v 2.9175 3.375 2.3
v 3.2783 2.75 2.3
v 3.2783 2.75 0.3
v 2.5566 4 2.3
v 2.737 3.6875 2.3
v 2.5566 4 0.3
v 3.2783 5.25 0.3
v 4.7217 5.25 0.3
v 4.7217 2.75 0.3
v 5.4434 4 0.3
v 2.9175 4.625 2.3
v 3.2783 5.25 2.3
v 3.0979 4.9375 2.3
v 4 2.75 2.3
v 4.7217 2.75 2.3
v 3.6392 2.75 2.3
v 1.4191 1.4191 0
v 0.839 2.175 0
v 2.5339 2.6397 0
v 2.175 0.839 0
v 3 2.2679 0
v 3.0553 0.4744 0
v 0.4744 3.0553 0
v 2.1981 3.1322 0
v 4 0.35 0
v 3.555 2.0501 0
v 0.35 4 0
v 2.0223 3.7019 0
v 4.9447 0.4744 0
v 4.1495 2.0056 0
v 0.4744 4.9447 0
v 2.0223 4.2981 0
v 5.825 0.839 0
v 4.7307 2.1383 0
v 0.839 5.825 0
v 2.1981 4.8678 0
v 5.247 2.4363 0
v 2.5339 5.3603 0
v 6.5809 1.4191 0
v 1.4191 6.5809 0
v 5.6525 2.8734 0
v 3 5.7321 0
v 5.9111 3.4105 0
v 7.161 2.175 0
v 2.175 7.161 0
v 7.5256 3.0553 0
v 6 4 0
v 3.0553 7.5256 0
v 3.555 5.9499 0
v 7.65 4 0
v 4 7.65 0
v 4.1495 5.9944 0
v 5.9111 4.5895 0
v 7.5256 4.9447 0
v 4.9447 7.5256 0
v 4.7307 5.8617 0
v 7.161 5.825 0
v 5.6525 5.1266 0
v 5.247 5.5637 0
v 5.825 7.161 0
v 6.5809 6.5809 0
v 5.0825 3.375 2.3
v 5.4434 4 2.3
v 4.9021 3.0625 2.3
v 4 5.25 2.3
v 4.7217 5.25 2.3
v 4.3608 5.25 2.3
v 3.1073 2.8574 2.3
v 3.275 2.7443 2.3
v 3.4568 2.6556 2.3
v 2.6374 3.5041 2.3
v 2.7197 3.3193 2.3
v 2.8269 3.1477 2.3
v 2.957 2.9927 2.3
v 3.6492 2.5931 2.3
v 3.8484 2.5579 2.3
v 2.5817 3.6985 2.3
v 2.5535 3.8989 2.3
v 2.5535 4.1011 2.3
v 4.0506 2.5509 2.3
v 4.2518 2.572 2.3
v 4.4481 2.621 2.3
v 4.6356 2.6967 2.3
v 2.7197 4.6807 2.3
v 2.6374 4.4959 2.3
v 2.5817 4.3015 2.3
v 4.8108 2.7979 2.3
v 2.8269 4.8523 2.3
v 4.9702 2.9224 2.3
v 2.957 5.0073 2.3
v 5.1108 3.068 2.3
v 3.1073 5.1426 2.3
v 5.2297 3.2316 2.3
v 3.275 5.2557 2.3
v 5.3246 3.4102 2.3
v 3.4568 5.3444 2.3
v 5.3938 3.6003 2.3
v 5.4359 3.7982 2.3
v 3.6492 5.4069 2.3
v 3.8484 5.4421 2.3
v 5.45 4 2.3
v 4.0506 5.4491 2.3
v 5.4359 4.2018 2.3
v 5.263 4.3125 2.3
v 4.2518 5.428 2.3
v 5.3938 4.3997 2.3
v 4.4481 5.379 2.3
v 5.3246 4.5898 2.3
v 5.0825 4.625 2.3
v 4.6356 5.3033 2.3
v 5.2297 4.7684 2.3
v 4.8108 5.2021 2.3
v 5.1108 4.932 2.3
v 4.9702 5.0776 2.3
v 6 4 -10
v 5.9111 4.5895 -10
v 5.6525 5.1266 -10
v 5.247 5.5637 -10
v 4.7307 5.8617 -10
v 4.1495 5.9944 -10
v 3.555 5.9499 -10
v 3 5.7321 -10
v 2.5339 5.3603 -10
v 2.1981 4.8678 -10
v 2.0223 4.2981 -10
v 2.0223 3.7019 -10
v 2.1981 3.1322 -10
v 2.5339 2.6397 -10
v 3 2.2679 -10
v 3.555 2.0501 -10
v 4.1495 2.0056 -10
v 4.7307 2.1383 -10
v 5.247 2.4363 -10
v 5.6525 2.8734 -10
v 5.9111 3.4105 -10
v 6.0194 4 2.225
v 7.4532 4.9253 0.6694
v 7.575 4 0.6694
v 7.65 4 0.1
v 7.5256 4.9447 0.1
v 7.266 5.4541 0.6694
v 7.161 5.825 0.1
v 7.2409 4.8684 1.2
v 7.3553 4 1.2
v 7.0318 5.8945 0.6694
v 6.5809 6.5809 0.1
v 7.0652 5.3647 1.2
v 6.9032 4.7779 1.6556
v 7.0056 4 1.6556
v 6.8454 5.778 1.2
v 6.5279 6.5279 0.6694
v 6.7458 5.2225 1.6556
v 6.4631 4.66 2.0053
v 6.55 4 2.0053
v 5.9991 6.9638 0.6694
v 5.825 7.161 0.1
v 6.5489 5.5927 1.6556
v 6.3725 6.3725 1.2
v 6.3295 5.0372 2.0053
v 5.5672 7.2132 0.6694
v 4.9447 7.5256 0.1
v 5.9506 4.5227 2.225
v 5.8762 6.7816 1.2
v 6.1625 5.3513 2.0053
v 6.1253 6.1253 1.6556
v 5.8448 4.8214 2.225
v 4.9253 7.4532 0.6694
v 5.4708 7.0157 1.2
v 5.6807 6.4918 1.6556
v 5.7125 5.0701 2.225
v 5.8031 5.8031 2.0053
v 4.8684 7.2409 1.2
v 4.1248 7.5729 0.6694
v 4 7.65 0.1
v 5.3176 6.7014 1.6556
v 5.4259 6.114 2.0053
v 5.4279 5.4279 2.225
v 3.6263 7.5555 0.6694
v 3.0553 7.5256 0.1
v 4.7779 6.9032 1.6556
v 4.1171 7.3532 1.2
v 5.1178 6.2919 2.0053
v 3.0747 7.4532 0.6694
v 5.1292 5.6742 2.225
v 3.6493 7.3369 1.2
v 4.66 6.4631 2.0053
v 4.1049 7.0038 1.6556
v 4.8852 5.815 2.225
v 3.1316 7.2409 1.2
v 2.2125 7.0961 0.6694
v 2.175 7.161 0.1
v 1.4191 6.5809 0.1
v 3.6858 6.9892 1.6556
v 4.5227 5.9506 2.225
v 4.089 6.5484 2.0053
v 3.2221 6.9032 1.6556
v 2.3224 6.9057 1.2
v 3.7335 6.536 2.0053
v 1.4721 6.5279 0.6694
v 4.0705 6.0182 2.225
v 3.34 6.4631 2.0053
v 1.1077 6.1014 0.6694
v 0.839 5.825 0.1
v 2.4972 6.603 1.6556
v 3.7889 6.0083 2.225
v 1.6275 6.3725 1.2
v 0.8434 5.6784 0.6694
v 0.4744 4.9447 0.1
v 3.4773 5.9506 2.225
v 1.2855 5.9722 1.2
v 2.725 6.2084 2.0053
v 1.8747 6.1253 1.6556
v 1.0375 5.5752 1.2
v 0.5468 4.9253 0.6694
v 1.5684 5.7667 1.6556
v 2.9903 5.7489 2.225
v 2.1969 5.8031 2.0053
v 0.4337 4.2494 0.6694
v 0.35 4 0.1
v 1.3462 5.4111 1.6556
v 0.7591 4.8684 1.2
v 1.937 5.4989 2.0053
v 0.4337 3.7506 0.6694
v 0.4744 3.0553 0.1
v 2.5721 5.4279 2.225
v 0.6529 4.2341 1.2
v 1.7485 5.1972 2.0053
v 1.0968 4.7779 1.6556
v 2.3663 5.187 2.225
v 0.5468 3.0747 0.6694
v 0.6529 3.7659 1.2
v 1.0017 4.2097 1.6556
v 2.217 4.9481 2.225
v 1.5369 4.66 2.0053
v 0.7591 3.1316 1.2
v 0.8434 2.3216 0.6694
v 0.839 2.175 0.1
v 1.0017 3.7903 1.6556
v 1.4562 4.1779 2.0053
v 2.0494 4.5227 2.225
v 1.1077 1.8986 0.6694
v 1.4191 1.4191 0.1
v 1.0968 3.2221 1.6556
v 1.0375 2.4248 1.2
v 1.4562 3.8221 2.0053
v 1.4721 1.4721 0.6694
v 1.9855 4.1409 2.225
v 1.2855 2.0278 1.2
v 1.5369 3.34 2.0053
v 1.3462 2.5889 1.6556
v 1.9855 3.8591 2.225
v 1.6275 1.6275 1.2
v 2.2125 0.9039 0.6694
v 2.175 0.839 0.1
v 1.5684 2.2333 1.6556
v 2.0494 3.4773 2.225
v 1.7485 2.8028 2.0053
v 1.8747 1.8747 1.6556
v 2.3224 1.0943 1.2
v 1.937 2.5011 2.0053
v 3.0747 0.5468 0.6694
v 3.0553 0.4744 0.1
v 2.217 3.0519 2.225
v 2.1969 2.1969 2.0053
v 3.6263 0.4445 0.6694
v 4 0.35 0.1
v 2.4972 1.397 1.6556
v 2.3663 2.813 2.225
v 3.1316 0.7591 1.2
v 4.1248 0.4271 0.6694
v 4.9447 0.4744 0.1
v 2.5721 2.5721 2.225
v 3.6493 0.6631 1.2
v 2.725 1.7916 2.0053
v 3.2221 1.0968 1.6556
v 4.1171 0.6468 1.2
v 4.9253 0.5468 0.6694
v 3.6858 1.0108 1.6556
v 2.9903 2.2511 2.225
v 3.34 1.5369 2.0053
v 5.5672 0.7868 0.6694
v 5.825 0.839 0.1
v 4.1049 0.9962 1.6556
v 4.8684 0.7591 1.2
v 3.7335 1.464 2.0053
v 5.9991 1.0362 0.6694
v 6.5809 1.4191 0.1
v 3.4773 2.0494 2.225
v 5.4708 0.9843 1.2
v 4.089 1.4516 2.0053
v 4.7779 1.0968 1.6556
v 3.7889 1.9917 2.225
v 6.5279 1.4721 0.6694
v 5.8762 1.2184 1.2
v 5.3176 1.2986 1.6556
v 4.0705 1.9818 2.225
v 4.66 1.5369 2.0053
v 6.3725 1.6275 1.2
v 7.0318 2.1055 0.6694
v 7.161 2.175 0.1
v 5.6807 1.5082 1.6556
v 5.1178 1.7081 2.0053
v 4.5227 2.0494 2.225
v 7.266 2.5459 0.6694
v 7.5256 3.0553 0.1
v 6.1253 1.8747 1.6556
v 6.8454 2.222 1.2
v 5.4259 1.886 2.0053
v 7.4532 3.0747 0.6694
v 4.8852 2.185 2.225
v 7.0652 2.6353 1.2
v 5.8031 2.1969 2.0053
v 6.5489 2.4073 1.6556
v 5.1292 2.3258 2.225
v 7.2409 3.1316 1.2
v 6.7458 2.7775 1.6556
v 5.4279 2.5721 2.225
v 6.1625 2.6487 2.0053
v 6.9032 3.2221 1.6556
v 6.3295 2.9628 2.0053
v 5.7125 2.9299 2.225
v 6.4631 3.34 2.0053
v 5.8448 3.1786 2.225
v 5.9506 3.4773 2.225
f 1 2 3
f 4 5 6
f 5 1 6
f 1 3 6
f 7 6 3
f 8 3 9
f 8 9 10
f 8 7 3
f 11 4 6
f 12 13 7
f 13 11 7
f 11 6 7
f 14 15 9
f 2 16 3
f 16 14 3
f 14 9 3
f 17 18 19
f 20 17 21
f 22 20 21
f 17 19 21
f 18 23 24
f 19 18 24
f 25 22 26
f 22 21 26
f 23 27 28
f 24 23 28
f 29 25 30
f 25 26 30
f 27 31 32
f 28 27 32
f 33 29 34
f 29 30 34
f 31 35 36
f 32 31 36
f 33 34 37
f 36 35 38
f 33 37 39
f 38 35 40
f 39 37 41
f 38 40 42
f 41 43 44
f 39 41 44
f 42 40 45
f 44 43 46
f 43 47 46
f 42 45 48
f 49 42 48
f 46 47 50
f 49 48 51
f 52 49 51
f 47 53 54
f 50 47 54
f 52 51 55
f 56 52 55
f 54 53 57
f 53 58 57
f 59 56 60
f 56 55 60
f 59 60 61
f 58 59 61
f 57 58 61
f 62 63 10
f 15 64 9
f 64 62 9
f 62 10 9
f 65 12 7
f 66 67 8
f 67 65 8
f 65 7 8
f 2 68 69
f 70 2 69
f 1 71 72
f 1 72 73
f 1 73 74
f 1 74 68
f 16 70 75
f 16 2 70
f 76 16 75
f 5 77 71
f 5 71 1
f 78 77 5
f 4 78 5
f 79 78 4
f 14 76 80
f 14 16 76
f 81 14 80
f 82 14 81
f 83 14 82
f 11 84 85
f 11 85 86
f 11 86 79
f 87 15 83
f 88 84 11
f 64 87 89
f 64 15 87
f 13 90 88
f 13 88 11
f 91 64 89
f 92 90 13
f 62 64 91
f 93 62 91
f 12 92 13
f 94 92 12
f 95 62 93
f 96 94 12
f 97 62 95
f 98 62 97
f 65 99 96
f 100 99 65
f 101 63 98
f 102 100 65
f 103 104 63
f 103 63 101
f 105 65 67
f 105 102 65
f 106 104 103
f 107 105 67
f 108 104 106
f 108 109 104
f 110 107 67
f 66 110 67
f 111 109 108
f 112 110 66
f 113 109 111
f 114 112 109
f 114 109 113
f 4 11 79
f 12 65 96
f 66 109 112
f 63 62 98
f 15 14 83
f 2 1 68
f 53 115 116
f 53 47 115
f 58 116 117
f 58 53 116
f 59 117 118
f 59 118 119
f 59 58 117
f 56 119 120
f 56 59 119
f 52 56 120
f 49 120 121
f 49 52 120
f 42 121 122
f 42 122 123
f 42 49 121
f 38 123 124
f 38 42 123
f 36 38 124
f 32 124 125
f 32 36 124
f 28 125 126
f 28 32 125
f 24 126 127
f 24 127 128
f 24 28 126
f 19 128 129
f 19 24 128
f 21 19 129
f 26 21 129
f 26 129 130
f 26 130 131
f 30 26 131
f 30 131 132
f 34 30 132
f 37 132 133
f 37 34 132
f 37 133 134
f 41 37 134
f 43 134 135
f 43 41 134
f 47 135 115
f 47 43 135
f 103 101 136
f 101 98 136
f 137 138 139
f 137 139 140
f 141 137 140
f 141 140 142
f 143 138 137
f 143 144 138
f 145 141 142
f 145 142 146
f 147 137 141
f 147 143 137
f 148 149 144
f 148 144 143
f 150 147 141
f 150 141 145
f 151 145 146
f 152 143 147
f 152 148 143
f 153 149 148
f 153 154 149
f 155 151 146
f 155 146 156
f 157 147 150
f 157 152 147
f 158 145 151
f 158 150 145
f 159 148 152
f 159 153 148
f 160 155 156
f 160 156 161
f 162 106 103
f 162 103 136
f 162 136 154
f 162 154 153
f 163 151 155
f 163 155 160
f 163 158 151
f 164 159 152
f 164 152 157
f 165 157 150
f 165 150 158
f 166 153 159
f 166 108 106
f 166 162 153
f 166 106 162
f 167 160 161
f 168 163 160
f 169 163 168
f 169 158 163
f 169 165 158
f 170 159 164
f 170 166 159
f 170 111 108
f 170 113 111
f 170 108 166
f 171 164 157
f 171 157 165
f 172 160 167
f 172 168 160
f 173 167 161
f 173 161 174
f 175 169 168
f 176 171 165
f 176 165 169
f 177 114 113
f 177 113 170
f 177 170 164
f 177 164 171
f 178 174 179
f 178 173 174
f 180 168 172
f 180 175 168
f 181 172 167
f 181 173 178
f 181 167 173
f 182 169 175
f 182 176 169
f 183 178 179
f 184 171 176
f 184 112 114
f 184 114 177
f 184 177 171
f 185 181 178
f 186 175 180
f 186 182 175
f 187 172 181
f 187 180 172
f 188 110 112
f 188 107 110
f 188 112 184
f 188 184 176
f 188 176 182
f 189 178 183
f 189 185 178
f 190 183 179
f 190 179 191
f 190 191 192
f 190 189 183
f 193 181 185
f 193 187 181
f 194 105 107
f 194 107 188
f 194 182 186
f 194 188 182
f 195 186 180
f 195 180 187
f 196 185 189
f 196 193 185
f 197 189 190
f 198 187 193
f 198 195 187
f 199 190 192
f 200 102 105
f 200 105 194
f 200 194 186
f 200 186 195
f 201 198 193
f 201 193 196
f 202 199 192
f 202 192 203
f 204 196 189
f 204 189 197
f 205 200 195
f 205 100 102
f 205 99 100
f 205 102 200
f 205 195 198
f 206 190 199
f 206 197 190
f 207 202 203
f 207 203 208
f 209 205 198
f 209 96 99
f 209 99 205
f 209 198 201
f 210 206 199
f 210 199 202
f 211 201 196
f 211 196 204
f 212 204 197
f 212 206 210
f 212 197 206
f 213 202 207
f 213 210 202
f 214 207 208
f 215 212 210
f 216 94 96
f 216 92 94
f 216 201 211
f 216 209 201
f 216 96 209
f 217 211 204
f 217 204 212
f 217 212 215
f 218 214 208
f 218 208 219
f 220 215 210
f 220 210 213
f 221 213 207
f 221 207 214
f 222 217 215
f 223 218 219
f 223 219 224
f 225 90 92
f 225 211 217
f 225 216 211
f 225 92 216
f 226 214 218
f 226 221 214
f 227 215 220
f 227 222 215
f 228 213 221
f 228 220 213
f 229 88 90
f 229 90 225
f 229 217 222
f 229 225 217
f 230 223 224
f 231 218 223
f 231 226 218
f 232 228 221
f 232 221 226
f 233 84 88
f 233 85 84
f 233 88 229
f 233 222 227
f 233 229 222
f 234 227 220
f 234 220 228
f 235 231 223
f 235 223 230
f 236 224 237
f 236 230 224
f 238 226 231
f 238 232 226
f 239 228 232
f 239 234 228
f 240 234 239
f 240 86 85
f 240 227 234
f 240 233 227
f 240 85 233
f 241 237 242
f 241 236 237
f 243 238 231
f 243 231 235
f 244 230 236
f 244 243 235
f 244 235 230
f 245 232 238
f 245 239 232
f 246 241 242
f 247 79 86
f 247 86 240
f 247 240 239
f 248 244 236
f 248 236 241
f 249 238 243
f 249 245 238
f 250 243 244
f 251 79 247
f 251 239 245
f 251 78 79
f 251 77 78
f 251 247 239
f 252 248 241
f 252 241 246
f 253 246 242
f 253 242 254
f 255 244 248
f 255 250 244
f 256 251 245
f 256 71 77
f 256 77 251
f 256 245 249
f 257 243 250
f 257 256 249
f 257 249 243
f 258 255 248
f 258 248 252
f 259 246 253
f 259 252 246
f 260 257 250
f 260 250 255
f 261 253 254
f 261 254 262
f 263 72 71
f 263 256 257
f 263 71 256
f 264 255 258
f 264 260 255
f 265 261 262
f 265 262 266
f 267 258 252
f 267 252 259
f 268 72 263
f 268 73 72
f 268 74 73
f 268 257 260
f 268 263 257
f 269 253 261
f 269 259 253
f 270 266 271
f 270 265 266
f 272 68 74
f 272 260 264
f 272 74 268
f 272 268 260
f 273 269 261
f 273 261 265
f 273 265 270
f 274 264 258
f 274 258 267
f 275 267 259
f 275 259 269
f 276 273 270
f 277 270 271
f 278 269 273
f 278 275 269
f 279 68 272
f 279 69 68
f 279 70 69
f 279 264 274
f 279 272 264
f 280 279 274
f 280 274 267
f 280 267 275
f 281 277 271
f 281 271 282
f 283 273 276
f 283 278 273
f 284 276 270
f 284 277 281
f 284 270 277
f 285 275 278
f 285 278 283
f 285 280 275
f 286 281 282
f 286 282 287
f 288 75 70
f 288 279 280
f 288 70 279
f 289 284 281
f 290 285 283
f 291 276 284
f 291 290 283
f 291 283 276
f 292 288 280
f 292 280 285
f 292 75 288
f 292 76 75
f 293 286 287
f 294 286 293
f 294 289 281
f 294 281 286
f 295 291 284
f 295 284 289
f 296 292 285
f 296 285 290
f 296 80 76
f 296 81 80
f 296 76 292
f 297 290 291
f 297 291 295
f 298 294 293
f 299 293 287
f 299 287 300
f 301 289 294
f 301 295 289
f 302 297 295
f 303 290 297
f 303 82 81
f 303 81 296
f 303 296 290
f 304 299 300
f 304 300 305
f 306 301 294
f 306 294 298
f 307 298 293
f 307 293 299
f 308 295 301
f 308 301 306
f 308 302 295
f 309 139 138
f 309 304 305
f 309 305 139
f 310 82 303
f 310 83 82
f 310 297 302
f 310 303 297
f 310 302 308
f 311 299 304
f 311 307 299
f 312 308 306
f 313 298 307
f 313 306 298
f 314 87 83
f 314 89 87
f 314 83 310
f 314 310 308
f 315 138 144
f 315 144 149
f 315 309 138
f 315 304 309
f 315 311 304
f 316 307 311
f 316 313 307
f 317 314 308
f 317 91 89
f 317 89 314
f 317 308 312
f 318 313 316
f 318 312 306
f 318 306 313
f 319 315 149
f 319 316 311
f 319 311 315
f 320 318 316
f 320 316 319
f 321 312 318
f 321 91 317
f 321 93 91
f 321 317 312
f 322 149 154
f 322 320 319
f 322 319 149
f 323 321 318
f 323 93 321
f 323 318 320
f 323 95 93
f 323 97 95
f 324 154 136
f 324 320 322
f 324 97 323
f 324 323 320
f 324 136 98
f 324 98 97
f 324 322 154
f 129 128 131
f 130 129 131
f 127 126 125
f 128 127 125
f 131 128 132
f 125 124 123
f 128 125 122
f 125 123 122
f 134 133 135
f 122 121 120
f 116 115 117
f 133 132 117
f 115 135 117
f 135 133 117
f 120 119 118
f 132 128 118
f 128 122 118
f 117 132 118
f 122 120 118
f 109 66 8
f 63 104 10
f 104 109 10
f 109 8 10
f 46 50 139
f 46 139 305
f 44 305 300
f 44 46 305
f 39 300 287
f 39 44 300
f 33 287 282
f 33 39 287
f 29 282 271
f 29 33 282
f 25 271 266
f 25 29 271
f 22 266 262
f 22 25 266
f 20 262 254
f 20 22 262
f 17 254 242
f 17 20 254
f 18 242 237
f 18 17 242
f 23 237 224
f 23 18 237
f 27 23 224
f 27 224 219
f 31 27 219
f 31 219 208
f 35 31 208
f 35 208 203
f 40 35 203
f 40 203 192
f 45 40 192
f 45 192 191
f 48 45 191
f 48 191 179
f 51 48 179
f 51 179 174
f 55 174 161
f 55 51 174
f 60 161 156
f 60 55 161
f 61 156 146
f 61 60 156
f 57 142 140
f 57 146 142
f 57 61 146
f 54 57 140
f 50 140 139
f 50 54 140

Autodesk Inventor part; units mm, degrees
ref_plane "YZ Plane" through (0, 0, 0) normal (1, 0, 0) x (0, 1, 0)
ref_plane "XZ Plane" through (0, 0, 0) normal (0, 1, 0) x (-1, 0, 0)
ref_plane "XY Plane" through (0, 0, 0) normal (0, 0, 1) x (1, 0, 0)
sketch "Sketch1" plane through (0, 0, 0) normal (0, 0, 1) x (1, 0, 0)
  circle A0 centre (4, 4) radius 1.2 projected
  circle A1 centre (4, 4) radius 2
  point P0 (0, 0)
  dimension "d0" = 4
extrude "Extrusion1" add sketch "Sketch1" against normal blind 10 contours A0 | A1
sketch "Sketch2" plane through (4, 4, 0) normal (0, 0, 1) x (1, 0, 0)
  circle A0 centre (0, 0) radius 2 projected
  circle A1 centre (0, 0) radius 3.65
  point P0 (-4, -4)
  dimension "d3" = 7.3
extrude "Extrusion2" add sketch "Sketch2" along normal blind 2.3 contours A0 | A1
fillet "Fillet1" radius 2.2 1 edges at (0.35, 4, 2.3)
sketch "Sketch4" plane through (4, 4, 2.3) normal (0, 0, 1) x (1, 0, 0)
  circle A0 centre (0, 0) radius 1.45 projected
  line L0 (0.7217, 1.25) -> (1.4434, 0)
  line L1 (1.4434, 0) -> (0.7217, -1.25)
  line L2 (0.7217, -1.25) -> (-0.7217, -1.25)
  line L3 (-0.7217, -1.25) -> (-1.4434, 0)
  line L4 (-1.4434, 0) -> (-0.7217, 1.25)
  line L5 (-0.7217, 1.25) -> (0.7217, 1.25)
  point P0 (-4, -4)
  dimension "d10" = 2.5
extrude "Extrusion4" cut sketch "Sketch4" along normal mid plane 4 contours L0 L1 L2 L3 L4 L5
thread "Thread1" size "M3x0.5" class "6g" standard "ANSI Metric M Profile" full length
properties part number "m3 6" material "Steel"
